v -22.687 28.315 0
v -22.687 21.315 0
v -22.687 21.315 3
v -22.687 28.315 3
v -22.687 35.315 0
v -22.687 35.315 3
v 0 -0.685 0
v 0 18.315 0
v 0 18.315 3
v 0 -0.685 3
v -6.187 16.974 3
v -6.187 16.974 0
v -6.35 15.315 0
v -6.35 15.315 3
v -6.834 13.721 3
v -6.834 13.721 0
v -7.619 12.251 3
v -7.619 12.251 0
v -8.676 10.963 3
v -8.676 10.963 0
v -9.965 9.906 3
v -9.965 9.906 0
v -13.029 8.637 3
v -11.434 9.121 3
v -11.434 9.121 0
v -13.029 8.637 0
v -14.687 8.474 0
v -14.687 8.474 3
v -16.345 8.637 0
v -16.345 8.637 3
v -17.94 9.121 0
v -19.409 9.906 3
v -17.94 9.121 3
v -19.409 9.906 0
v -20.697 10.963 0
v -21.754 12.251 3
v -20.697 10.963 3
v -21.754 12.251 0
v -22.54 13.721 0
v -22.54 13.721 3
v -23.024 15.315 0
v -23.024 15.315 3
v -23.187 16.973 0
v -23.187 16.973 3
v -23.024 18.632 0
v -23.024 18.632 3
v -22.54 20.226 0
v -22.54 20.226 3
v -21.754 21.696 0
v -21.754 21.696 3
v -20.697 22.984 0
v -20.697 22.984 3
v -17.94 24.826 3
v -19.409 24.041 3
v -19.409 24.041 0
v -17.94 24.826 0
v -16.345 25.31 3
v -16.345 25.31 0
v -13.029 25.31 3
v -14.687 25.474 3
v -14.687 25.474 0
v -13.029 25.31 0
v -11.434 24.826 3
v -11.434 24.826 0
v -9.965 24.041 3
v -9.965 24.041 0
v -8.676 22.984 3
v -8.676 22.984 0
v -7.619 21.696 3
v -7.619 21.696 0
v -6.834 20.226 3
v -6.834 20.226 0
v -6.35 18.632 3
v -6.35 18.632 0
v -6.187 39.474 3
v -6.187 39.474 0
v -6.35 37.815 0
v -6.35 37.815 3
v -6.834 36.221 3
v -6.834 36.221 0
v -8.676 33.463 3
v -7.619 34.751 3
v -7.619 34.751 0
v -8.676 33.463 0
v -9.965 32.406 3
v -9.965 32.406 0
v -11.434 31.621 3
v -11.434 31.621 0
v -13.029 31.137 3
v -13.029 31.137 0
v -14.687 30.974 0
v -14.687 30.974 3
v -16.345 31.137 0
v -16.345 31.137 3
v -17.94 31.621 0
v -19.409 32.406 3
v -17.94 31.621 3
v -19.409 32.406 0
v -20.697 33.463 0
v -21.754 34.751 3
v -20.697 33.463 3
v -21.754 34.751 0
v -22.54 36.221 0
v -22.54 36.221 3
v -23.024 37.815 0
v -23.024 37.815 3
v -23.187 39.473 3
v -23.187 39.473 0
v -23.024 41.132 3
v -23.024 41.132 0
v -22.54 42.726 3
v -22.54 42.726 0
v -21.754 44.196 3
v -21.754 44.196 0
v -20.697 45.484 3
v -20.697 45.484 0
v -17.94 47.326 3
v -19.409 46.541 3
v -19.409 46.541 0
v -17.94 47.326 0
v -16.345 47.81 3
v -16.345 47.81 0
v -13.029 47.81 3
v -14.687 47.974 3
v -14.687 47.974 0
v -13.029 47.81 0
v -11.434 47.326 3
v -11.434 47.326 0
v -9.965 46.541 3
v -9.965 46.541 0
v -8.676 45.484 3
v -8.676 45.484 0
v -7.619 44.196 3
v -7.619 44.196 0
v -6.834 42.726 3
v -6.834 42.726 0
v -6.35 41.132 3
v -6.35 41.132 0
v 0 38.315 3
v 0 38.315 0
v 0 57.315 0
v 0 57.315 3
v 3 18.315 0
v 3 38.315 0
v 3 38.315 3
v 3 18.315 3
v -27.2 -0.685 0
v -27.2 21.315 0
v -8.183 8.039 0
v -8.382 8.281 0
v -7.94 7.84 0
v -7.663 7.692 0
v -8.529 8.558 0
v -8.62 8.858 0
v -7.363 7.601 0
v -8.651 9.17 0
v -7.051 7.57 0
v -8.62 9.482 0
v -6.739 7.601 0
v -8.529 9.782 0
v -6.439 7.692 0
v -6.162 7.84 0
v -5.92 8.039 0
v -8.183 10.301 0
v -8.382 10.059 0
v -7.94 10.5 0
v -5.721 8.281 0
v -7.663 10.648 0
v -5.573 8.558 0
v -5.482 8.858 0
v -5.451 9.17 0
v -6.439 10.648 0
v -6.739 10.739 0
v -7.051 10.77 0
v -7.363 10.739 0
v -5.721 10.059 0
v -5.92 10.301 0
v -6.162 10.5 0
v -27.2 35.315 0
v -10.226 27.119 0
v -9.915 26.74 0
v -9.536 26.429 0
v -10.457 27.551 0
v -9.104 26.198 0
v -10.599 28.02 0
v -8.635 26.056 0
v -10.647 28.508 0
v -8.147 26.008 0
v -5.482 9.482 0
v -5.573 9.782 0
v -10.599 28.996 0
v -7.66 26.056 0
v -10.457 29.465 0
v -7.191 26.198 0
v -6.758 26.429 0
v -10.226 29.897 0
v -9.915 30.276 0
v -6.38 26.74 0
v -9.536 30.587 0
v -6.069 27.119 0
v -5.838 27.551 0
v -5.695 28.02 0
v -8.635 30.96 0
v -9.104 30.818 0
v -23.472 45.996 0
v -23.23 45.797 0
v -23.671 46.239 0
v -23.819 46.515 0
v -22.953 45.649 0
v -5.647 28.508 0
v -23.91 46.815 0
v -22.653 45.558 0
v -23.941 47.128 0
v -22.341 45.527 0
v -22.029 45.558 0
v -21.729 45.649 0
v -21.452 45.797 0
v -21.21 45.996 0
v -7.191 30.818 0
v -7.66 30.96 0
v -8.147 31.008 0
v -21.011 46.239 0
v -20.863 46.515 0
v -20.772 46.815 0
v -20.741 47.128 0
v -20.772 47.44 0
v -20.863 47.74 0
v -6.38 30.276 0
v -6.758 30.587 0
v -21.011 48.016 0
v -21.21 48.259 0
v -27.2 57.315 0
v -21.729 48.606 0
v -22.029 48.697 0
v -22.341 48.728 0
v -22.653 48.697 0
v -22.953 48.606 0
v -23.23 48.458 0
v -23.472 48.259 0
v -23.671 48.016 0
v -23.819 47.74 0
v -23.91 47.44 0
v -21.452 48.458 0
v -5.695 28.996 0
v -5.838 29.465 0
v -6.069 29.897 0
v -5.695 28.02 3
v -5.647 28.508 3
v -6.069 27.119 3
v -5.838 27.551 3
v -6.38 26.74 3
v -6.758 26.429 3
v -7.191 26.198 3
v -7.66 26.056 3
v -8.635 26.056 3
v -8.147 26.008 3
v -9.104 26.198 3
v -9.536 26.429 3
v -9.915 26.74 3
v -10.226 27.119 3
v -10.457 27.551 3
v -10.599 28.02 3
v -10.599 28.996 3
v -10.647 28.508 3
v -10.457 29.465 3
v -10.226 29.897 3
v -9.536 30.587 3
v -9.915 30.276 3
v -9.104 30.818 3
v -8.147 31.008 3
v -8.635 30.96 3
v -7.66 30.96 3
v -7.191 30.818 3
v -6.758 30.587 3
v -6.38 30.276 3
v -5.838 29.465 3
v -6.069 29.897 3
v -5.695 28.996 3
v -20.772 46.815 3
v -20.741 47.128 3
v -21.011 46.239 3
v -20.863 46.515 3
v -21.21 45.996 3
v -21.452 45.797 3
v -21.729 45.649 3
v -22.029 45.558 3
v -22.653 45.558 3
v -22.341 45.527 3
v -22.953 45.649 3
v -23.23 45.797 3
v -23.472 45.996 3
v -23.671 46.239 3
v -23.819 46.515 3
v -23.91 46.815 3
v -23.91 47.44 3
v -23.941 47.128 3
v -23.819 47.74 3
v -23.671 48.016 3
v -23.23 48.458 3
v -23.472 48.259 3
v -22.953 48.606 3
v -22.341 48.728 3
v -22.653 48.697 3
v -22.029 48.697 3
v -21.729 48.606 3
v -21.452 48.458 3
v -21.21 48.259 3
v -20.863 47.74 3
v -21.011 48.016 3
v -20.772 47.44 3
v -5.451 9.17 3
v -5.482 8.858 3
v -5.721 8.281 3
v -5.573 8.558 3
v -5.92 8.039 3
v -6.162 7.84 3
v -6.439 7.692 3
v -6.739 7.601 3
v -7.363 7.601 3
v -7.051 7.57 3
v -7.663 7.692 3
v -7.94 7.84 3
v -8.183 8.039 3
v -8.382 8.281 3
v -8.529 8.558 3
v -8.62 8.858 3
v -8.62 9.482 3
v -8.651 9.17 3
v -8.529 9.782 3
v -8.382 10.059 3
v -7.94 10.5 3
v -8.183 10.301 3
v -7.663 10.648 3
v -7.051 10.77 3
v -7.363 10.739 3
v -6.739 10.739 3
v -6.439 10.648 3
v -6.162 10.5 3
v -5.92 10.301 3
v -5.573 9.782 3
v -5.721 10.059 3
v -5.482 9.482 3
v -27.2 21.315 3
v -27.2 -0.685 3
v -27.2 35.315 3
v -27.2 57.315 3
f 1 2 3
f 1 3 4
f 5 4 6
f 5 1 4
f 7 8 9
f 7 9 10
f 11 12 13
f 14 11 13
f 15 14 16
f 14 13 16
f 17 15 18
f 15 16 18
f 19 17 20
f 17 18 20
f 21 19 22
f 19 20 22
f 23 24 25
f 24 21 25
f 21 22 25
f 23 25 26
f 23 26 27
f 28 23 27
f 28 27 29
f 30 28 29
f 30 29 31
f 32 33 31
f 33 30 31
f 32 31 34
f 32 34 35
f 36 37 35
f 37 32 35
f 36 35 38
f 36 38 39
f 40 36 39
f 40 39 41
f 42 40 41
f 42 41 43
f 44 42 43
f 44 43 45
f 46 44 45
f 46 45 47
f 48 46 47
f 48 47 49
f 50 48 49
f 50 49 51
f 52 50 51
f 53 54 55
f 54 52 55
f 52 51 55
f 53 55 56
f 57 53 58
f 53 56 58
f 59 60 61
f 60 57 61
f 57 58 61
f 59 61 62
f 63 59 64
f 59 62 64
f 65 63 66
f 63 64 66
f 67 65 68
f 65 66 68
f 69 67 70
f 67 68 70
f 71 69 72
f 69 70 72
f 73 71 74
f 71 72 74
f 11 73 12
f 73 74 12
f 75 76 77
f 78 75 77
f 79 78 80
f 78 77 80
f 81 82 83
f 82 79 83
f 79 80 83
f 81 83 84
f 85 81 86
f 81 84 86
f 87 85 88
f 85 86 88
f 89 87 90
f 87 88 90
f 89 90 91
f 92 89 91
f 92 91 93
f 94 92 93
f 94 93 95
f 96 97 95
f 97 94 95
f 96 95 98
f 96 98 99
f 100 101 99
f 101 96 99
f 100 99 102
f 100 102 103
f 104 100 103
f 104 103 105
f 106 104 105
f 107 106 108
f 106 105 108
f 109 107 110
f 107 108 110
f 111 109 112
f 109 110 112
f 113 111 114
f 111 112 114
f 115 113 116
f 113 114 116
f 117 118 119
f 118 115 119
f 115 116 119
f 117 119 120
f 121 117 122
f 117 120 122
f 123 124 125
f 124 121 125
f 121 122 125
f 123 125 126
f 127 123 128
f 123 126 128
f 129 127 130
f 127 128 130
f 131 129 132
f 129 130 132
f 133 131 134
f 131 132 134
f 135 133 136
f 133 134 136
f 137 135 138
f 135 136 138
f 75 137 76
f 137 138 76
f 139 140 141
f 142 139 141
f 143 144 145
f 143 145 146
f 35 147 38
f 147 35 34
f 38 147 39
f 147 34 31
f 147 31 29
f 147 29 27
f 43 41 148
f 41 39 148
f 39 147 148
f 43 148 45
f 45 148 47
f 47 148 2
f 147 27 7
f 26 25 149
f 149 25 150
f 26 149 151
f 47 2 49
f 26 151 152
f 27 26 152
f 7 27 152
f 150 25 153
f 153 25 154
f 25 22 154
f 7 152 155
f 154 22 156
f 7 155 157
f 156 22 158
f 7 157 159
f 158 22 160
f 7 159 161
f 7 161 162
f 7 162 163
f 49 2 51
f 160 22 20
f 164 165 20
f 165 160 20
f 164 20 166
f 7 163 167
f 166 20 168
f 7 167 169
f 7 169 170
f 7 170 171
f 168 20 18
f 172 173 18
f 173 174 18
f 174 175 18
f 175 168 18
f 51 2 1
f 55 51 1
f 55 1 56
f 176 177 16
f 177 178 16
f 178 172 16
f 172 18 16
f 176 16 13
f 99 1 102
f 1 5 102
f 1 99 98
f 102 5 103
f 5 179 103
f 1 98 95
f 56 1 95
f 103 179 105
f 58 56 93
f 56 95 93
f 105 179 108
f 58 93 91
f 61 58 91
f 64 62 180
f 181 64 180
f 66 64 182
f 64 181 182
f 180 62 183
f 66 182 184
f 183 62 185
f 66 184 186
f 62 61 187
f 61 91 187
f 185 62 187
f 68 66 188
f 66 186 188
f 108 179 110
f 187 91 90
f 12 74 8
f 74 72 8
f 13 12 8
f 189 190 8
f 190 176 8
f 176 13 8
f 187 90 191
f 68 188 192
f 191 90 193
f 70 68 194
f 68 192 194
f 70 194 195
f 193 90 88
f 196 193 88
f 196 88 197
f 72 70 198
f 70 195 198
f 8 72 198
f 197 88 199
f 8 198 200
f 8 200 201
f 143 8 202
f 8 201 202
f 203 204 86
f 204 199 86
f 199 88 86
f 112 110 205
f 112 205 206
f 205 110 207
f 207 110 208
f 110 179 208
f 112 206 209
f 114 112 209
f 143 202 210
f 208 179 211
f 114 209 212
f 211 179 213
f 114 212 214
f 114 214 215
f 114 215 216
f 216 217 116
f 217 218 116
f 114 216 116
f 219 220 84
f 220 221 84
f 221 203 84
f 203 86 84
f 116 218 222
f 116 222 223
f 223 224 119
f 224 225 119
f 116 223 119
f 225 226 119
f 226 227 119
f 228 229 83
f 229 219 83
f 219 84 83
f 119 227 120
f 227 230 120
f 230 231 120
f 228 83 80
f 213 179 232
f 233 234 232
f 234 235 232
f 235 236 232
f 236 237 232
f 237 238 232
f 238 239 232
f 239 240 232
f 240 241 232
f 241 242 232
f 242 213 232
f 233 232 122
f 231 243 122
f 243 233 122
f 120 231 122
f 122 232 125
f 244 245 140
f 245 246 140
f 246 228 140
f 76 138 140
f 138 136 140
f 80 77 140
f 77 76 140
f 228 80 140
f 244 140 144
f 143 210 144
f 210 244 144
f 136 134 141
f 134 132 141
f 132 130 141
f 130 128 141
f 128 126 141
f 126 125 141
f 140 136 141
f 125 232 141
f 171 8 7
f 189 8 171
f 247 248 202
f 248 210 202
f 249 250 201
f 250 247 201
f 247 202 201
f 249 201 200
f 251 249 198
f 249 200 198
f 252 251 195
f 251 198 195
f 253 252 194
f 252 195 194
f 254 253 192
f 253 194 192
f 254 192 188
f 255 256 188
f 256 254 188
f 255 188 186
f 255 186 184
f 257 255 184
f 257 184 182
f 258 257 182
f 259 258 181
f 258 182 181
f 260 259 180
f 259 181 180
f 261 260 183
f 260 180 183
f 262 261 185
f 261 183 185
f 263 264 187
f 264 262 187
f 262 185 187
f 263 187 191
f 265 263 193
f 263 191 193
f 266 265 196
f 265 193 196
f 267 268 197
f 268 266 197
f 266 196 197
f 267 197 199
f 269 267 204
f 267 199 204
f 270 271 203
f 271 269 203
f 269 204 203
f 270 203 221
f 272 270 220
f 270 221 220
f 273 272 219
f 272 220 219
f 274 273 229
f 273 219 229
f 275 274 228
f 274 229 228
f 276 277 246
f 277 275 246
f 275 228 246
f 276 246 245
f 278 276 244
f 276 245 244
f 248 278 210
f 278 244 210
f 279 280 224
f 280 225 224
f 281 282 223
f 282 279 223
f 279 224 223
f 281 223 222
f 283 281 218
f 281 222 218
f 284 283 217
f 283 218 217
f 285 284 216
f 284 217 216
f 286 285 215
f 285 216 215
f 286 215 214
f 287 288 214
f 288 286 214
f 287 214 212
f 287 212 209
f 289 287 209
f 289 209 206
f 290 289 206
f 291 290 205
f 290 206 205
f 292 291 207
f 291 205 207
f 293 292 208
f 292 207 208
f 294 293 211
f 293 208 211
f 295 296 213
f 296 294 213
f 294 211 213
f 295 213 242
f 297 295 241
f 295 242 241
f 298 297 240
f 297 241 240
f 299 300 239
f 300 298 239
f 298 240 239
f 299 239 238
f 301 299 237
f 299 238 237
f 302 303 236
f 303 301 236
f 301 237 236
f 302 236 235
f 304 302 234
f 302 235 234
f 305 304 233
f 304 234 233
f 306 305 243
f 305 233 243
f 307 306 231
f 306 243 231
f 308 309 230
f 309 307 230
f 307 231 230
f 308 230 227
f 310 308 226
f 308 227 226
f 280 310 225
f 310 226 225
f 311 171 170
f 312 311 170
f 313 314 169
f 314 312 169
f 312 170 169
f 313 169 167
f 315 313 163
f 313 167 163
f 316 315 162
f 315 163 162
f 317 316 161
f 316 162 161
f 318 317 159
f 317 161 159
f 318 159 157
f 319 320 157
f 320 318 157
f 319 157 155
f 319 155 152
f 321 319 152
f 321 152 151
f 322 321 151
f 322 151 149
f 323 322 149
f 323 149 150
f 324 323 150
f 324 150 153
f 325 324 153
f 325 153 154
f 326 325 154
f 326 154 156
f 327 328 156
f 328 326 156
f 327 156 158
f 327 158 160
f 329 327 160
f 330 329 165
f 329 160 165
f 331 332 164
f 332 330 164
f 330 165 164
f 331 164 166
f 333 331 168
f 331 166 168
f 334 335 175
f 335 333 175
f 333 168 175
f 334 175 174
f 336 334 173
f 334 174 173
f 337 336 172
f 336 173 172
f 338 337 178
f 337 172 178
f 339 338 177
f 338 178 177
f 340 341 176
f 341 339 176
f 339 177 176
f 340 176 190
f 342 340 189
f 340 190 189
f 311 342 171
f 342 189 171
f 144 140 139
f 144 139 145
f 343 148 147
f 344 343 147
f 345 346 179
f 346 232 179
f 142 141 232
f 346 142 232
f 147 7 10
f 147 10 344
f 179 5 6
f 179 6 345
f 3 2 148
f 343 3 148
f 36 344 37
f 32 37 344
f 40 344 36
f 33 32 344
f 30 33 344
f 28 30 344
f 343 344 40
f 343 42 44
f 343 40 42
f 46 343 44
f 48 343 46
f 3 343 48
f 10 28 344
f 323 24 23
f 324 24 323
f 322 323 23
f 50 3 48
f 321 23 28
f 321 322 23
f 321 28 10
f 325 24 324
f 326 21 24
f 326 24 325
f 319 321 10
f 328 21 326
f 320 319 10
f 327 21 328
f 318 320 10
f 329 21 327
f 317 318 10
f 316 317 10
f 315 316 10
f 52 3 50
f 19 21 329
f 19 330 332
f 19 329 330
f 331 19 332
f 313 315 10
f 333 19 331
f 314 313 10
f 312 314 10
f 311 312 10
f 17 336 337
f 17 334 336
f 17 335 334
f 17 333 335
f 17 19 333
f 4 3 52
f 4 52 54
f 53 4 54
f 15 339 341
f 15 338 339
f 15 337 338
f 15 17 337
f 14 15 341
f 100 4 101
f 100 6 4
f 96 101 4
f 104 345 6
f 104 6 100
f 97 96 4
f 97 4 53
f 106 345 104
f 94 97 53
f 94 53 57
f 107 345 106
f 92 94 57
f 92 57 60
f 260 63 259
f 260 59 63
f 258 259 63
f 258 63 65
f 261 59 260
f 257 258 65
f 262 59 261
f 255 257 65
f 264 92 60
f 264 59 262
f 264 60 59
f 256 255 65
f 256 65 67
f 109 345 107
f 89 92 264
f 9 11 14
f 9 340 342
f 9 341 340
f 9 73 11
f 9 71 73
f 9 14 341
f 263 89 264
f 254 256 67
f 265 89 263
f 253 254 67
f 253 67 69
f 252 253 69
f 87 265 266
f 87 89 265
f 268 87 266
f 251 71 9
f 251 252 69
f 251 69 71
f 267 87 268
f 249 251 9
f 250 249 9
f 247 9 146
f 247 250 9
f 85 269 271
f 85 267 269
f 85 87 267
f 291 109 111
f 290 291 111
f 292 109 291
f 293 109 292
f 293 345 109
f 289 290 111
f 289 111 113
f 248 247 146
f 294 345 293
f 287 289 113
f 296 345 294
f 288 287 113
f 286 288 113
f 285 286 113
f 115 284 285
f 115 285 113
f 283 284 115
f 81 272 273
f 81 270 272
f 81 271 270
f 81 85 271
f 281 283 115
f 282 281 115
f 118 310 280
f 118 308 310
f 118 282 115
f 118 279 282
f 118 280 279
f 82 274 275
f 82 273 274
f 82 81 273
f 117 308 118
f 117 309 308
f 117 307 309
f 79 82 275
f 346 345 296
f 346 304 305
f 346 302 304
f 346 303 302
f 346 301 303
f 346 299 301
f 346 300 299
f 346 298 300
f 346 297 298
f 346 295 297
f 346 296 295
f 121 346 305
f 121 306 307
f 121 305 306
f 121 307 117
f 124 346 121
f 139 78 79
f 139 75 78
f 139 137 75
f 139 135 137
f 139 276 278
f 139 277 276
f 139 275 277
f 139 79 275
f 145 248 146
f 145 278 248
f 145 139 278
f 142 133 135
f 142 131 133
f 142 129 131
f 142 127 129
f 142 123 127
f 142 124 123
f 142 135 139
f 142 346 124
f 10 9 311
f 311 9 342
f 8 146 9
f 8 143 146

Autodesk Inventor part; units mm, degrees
ref_plane "YZ Plane" through (0, 0, 0) normal (1, 0, 0) x (0, 1, 0)
ref_plane "XZ Plane" through (0, 0, 0) normal (0, 1, 0) x (-1, 0, 0)
ref_plane "XY Plane" through (0, 0, 0) normal (0, 0, 1) x (1, 0, 0)
sketch "Sketch1" plane through (0, 0, 0) normal (0, 0, 1) x (1, 0, 0)
  circle A0 centre (-14.6869, 39.4735) radius 8.5
  circle A1 centre (-22.3409, 47.1275) radius 1.6
  circle A2 centre (-7.0512, 9.17) radius 1.6
  circle A3 centre (-8.1473, 28.508) radius 2.5
  circle A4 centre (-14.6869, 16.9735) radius 8.5
  line L0 (0, 28.315) -> (0, -0.685)
  line L1 (0, -0.685) -> (-27.2, -0.685)
  line L2 (-27.2, -0.685) -> (0, -0.685)
  line L3 (0, -0.685) -> (0, 57.315)
  line L4 (0, 57.315) -> (-27.2, 57.315)
  line L5 (-27.2, 57.315) -> (-27.2, -0.685)
  line L6 (0, 28.315) -> (0, 38.315)
  line L7 (0, 38.315) -> (3, 38.315)
  line L8 (3, 38.315) -> (3, 18.315)
  line L9 (3, 18.315) -> (0, 18.315)
  line L10 (-14.6869, 39.4735) -> (-14.6869, 28.315)
  line L11 (-14.6869, 28.315) -> (-22.6869, 28.315)
  line L12 (-22.6869, 28.315) -> (-22.6869, 21.315)
  line L13 (-22.6869, 21.315) -> (-22.6869, 35.315)
  line L14 (-22.6869, 35.315) -> (-27.2, 35.315)
  line L15 (-22.6869, 21.315) -> (-27.2, 21.315)
  point P0 (0, 0)
  point P1 (-5.6598, 20.3223)
  dimension "d1" = 29
  dimension "d2" = 58
  dimension "d3" = 10
  dimension "d4" = 3
  dimension "d5" = 20
  dimension "d10" = 8
  dimension "d11" = 7
  dimension "d12" = 14
extrude "Extrusion2" add sketch "Sketch1" along normal blind 3 contours L13 L14 L5 L4 L3 L0 L1 L15 L12 | L0 L3 L7 L8 L9
sketch "Sketch2" plane through (0, 0, 3) normal (0, 0, 1) x (1, 0, 0)
  circle A0 centre (-14.6869, 16.9735) radius 8.5 projected
  circle A1 centre (-14.6869, 39.4735) radius 8.5 projected
  circle A2 centre (-8.1473, 28.508) radius 2.5 projected
  circle A3 centre (-7.0512, 9.17) radius 1.6 projected
  circle A4 centre (-22.3409, 47.1275) radius 1.6 projected
  line L0 (0, 18.315) -> (3, 18.315) projected
  line L1 (3, 18.315) -> (3, 38.315) projected
  line L2 (3, 38.315) -> (0, 38.315) projected
  line L3 (0, 38.315) -> (0, 57.315) projected
  line L4 (0, 57.315) -> (-27.2, 57.315) projected
  line L5 (-27.2, 57.315) -> (-27.2, 35.315) projected
  line L6 (-27.2, 35.315) -> (-22.6869, 35.315) projected
  line L7 (-22.6869, 35.315) -> (-22.6869, 21.315) projected
  line L8 (-22.6869, 21.315) -> (-27.2, 21.315) projected
  line L9 (-27.2, 21.315) -> (-27.2, -0.685) projected
  line L10 (-27.2, -0.685) -> (0, -0.685) projected
  line L11 (0, -0.685) -> (0, 18.315) projected
  line L12 (-40, 69) -> (-28.75, 69)
  point P0 (0, 0)
  dimension "d15" = 17
  dimension "d16" = 3.2
  dimension "d17" = 5
  dimension "d18" = 22.5
  dimension "d19" = 7.654
  dimension "d20" = 7.654
  dimension "d21" = 7.6357
  dimension "d22" = 7.8035
  dimension "d23" = 6.5396
  dimension "d24" = 11.5345
  dimension "d25" = 10.9655
  dimension "d26" = 11.25
equation "\"d26\" = 0.5 * d24 + 0.5 * d25"
properties part number "srf"
